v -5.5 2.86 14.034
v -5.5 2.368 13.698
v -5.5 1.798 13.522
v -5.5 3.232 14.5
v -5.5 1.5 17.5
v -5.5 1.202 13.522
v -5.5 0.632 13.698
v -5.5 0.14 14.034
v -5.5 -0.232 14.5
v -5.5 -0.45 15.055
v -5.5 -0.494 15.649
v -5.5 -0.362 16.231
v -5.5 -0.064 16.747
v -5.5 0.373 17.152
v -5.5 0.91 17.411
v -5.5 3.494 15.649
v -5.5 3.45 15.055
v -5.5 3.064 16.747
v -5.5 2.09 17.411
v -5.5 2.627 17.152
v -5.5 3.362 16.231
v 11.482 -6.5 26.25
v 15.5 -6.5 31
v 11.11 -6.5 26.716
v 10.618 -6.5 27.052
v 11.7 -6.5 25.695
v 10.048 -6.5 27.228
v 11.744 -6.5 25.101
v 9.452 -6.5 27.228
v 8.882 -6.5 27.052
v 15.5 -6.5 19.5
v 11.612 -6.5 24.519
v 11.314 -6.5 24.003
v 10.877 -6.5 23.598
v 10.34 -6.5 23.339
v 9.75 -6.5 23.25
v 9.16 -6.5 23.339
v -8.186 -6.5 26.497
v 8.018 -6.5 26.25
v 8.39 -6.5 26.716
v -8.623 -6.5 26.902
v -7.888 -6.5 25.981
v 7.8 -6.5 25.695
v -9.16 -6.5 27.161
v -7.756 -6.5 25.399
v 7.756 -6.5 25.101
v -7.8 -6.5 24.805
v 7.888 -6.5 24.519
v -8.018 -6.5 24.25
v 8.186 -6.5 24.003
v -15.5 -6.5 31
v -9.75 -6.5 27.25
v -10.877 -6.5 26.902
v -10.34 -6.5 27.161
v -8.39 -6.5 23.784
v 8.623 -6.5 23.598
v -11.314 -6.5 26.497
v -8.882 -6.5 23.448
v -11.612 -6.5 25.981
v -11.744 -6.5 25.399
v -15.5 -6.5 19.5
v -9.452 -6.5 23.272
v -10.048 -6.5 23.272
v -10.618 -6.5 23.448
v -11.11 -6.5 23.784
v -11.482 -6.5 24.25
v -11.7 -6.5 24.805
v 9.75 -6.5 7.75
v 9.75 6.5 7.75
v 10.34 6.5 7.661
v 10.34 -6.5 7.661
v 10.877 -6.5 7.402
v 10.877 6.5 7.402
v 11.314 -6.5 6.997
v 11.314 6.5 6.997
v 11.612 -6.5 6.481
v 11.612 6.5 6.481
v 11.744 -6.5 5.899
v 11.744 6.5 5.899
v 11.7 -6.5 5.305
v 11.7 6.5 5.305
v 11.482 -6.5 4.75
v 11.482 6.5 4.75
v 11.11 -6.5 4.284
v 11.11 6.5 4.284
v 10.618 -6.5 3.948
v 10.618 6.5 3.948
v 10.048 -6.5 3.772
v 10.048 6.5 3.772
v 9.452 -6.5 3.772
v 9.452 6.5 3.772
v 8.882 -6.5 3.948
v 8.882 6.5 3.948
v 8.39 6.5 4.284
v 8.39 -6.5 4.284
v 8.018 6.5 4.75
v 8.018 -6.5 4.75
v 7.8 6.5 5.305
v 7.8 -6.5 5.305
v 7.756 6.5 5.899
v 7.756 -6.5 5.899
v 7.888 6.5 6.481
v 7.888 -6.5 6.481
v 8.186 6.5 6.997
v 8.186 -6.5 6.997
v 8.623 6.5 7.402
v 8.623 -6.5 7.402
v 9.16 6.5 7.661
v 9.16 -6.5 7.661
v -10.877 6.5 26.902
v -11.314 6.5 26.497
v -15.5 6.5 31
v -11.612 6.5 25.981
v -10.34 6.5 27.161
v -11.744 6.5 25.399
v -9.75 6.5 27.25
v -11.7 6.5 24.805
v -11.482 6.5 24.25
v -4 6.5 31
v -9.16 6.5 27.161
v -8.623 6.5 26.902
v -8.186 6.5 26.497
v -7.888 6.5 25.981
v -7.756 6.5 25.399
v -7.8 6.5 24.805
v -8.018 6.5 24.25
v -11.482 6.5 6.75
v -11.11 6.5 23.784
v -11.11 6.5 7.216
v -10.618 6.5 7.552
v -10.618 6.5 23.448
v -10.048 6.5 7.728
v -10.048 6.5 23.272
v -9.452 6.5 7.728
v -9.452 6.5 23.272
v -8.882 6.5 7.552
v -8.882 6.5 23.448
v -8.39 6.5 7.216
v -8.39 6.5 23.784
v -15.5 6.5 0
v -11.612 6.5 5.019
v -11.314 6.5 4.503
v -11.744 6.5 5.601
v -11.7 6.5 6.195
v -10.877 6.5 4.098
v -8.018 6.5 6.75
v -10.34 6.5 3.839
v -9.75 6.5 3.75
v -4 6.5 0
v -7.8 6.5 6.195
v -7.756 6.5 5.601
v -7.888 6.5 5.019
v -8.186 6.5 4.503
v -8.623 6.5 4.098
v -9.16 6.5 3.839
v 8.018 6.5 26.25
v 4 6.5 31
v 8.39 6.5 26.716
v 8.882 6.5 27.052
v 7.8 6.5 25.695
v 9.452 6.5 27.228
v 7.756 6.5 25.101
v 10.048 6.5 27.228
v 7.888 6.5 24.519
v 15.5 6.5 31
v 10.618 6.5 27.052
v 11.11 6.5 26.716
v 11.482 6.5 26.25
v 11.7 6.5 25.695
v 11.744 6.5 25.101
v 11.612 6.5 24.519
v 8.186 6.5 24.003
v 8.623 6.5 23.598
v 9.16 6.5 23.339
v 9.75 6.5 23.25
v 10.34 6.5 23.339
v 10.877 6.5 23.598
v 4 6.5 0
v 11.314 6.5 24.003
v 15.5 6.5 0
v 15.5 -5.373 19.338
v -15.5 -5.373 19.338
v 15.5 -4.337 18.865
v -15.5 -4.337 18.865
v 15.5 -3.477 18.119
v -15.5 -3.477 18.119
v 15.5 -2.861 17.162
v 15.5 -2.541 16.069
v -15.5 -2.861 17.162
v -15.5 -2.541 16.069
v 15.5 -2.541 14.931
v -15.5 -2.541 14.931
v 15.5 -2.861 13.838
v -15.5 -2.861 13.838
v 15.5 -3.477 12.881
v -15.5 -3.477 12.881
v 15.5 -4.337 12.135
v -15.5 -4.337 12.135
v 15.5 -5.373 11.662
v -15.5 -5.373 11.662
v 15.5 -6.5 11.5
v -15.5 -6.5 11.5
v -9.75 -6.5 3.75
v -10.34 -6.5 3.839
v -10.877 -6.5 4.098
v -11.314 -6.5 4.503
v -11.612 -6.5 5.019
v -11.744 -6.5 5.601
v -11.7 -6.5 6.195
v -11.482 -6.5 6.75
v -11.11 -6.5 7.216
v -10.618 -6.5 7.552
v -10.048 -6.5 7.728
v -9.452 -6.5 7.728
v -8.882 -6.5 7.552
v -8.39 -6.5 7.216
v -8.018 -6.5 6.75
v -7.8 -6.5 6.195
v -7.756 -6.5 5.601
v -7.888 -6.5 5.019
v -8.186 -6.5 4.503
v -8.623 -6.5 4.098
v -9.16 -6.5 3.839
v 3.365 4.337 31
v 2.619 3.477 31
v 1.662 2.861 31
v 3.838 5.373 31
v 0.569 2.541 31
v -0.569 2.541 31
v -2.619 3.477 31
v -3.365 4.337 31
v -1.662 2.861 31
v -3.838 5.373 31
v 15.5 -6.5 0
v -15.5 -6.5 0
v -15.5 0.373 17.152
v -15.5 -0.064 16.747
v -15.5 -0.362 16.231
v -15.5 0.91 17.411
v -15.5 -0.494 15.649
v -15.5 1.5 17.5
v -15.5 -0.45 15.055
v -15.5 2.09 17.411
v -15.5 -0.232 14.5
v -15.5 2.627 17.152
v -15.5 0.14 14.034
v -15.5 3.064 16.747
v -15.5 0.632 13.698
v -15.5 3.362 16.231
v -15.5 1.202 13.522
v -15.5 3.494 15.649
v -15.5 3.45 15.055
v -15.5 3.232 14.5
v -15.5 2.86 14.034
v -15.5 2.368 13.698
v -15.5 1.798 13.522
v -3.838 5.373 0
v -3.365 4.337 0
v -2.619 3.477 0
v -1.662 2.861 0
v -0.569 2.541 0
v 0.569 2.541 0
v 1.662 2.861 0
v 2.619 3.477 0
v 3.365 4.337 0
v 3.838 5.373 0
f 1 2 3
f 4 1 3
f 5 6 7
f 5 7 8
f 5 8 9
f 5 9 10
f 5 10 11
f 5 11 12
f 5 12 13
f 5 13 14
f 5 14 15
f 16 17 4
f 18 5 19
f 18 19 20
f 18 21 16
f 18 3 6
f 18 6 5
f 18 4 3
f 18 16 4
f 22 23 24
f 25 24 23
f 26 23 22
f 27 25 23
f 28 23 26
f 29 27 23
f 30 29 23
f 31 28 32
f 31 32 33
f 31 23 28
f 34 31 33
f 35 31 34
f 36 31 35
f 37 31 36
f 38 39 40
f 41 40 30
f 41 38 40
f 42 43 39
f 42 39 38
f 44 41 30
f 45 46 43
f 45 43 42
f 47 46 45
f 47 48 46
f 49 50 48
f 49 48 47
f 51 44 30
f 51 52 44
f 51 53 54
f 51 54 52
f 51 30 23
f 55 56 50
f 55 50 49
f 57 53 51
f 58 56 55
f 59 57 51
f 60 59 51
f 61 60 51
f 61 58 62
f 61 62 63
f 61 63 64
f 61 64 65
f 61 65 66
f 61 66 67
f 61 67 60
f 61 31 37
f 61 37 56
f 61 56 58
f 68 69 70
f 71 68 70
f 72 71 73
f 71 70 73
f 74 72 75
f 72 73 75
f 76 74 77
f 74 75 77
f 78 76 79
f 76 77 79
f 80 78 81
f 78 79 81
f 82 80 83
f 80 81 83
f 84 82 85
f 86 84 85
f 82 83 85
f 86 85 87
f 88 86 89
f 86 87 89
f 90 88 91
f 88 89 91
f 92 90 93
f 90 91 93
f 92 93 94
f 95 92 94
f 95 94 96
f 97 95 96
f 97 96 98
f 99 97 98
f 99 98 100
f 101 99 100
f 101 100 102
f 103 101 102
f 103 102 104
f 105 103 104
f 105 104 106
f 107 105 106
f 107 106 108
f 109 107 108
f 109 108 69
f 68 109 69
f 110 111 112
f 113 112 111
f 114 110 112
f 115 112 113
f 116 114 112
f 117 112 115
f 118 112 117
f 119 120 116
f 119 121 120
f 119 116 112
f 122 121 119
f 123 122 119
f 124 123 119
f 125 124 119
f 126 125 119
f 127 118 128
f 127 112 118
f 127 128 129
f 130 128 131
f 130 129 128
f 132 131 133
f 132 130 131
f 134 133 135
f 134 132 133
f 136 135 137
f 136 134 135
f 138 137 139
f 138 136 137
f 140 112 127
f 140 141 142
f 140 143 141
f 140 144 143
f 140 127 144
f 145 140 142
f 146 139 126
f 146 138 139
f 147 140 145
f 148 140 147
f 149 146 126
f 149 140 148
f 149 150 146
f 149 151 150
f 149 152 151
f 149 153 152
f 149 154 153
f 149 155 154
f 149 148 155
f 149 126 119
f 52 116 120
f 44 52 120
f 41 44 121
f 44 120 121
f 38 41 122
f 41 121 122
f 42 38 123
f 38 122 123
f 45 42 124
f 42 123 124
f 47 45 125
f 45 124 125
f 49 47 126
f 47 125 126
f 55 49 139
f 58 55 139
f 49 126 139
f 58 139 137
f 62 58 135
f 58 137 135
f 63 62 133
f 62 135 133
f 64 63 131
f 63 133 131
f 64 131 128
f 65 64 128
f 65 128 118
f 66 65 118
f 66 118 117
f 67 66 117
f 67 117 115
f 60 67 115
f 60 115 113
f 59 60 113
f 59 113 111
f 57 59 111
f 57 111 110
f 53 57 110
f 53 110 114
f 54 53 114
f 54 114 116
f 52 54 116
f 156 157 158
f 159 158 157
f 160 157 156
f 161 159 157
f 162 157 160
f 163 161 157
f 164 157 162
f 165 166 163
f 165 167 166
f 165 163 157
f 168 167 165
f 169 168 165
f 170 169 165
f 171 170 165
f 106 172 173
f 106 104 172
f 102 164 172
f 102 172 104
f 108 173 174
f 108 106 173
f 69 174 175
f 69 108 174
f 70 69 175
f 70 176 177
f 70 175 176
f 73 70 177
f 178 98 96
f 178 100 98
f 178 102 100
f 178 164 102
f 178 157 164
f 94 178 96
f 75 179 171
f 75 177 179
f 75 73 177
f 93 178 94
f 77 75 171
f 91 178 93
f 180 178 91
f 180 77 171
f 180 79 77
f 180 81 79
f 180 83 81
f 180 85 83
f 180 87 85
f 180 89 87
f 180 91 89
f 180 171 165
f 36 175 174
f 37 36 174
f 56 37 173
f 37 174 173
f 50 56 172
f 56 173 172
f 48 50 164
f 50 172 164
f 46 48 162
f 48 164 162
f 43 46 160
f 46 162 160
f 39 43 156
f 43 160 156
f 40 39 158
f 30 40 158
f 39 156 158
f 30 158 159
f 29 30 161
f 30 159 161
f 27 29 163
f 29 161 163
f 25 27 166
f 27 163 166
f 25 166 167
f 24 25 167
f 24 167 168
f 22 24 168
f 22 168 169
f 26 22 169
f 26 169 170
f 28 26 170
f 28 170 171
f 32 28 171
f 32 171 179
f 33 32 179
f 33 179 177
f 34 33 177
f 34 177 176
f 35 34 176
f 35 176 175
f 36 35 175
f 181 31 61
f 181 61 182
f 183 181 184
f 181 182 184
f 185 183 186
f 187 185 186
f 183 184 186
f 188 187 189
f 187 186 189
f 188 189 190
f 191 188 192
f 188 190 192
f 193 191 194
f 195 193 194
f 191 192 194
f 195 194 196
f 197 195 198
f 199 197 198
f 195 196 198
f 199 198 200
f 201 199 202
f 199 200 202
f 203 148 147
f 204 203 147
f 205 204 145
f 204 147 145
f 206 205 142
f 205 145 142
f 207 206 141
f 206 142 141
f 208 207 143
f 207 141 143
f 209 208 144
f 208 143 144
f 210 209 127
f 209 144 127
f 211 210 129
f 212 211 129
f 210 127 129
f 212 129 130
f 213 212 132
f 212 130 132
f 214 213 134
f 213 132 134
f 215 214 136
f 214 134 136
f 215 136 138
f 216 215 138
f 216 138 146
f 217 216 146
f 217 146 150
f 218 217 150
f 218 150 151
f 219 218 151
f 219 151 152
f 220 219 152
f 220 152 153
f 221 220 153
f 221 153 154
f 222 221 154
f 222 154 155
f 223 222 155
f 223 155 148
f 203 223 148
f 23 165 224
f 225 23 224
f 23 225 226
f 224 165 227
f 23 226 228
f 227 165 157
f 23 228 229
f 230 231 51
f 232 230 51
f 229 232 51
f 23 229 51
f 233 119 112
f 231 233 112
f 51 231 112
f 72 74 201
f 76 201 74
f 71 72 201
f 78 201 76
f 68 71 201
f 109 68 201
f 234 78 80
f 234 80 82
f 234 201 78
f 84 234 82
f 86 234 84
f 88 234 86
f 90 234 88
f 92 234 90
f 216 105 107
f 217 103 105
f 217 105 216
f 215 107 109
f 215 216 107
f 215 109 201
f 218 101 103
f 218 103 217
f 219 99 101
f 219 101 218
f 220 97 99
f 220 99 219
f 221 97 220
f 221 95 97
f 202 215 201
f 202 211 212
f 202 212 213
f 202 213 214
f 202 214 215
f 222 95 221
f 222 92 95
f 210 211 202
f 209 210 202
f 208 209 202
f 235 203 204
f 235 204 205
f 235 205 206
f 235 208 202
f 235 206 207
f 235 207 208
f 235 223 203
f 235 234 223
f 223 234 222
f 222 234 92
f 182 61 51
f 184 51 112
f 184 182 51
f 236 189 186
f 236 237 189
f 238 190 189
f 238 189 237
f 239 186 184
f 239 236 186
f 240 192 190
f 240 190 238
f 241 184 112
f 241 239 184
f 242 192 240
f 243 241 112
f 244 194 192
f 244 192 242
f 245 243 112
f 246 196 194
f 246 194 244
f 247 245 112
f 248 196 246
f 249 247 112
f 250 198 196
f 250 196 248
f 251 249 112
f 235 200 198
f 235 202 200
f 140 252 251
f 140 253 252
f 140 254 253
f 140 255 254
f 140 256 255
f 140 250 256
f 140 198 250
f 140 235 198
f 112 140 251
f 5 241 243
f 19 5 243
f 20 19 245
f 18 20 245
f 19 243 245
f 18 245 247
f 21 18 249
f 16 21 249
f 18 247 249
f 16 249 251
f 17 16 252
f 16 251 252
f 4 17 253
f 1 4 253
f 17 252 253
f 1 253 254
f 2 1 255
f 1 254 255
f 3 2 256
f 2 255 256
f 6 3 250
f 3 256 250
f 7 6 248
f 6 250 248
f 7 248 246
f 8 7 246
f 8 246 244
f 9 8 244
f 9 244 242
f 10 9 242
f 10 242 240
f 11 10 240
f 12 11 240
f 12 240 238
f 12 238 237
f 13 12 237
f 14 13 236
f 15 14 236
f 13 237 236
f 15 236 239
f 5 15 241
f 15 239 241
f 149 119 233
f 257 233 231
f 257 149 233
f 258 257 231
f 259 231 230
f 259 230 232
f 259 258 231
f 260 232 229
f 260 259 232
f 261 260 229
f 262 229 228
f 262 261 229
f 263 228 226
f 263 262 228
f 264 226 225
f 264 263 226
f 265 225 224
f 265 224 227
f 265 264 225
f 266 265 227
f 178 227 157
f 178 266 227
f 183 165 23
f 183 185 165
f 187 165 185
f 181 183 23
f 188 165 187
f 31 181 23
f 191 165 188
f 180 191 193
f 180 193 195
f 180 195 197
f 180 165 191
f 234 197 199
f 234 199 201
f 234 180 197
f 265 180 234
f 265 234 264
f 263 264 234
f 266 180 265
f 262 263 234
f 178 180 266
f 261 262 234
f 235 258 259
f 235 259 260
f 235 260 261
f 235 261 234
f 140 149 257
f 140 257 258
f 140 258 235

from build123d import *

# Parameters (mm, degrees)
P_IDAT_VYSUNUT_M1_DEPTH  = 31
SKICA2_R                 = 4
ODEBRAT_VYSUNUT_M1_DEPTH = 45.319860108
SKICA3_R                 = 2
ODEBRAT_VYSUNUT_M2_DEPTH = 38.016888038
SKICA4_R                 = 2
ODEBRAT_VYSUNUT_M3_DEPTH = 10


with BuildPart() as part:
    # Skica1 → Přidat vysunutím1 (new body)
    with BuildSketch(Plane.XY):
        with BuildLine():
            Line((-15.5, 6.5), (-4, 6.5))
            ThreePointArc((-4, 6.5), (0, 2.5), (4, 6.5))
            Line((4, 6.5), (15.5, 6.5))
            Line((15.5, 6.5), (15.5, -6.5))
            Line((15.5, -6.5), (-15.5, -6.5))
            Line((-15.5, -6.5), (-15.5, 6.5))
        make_face()
    extrude(amount=P_IDAT_VYSUNUT_M1_DEPTH)

    # Skica2 → Odebrat vysunutím1 (cut, through all)
    with BuildSketch(Plane.ZY.offset(15.5)):
        with Locations((15.5, -6.5)):
            Circle(SKICA2_R)
    extrude(amount=-ODEBRAT_VYSUNUT_M1_DEPTH, mode=Mode.SUBTRACT)

    # Skica3 → Odebrat vysunutím2 (cut, through all)
    with BuildSketch(Plane(origin=(0, 6.5, 0), x_dir=(1, 0, 0), z_dir=(0, 1, 0))):
        with Locations(Location((9.75, -5.75, 0), (0, 0, 270))):
            Circle(SKICA3_R)
        with Locations(Location((9.75, -25.25, 0), (0, 0, 90))):
            Circle(SKICA3_R)
        with Locations(Location((-9.75, -25.25, 0), (0, 0, 270))):
            Circle(SKICA3_R)
        with Locations(Location((-9.75, -5.75, 0), (0, 0, 90))):
            Circle(SKICA3_R)
    extrude(amount=-ODEBRAT_VYSUNUT_M2_DEPTH, mode=Mode.SUBTRACT)

    # Skica4 → Odebrat vysunutím3 (cut)
    with BuildSketch(Plane.ZY.offset(15.5)):
        with Locations((15.5, 1.5)):
            Circle(SKICA4_R)
    extrude(amount=-ODEBRAT_VYSUNUT_M3_DEPTH, mode=Mode.SUBTRACT)


solid = part.part
